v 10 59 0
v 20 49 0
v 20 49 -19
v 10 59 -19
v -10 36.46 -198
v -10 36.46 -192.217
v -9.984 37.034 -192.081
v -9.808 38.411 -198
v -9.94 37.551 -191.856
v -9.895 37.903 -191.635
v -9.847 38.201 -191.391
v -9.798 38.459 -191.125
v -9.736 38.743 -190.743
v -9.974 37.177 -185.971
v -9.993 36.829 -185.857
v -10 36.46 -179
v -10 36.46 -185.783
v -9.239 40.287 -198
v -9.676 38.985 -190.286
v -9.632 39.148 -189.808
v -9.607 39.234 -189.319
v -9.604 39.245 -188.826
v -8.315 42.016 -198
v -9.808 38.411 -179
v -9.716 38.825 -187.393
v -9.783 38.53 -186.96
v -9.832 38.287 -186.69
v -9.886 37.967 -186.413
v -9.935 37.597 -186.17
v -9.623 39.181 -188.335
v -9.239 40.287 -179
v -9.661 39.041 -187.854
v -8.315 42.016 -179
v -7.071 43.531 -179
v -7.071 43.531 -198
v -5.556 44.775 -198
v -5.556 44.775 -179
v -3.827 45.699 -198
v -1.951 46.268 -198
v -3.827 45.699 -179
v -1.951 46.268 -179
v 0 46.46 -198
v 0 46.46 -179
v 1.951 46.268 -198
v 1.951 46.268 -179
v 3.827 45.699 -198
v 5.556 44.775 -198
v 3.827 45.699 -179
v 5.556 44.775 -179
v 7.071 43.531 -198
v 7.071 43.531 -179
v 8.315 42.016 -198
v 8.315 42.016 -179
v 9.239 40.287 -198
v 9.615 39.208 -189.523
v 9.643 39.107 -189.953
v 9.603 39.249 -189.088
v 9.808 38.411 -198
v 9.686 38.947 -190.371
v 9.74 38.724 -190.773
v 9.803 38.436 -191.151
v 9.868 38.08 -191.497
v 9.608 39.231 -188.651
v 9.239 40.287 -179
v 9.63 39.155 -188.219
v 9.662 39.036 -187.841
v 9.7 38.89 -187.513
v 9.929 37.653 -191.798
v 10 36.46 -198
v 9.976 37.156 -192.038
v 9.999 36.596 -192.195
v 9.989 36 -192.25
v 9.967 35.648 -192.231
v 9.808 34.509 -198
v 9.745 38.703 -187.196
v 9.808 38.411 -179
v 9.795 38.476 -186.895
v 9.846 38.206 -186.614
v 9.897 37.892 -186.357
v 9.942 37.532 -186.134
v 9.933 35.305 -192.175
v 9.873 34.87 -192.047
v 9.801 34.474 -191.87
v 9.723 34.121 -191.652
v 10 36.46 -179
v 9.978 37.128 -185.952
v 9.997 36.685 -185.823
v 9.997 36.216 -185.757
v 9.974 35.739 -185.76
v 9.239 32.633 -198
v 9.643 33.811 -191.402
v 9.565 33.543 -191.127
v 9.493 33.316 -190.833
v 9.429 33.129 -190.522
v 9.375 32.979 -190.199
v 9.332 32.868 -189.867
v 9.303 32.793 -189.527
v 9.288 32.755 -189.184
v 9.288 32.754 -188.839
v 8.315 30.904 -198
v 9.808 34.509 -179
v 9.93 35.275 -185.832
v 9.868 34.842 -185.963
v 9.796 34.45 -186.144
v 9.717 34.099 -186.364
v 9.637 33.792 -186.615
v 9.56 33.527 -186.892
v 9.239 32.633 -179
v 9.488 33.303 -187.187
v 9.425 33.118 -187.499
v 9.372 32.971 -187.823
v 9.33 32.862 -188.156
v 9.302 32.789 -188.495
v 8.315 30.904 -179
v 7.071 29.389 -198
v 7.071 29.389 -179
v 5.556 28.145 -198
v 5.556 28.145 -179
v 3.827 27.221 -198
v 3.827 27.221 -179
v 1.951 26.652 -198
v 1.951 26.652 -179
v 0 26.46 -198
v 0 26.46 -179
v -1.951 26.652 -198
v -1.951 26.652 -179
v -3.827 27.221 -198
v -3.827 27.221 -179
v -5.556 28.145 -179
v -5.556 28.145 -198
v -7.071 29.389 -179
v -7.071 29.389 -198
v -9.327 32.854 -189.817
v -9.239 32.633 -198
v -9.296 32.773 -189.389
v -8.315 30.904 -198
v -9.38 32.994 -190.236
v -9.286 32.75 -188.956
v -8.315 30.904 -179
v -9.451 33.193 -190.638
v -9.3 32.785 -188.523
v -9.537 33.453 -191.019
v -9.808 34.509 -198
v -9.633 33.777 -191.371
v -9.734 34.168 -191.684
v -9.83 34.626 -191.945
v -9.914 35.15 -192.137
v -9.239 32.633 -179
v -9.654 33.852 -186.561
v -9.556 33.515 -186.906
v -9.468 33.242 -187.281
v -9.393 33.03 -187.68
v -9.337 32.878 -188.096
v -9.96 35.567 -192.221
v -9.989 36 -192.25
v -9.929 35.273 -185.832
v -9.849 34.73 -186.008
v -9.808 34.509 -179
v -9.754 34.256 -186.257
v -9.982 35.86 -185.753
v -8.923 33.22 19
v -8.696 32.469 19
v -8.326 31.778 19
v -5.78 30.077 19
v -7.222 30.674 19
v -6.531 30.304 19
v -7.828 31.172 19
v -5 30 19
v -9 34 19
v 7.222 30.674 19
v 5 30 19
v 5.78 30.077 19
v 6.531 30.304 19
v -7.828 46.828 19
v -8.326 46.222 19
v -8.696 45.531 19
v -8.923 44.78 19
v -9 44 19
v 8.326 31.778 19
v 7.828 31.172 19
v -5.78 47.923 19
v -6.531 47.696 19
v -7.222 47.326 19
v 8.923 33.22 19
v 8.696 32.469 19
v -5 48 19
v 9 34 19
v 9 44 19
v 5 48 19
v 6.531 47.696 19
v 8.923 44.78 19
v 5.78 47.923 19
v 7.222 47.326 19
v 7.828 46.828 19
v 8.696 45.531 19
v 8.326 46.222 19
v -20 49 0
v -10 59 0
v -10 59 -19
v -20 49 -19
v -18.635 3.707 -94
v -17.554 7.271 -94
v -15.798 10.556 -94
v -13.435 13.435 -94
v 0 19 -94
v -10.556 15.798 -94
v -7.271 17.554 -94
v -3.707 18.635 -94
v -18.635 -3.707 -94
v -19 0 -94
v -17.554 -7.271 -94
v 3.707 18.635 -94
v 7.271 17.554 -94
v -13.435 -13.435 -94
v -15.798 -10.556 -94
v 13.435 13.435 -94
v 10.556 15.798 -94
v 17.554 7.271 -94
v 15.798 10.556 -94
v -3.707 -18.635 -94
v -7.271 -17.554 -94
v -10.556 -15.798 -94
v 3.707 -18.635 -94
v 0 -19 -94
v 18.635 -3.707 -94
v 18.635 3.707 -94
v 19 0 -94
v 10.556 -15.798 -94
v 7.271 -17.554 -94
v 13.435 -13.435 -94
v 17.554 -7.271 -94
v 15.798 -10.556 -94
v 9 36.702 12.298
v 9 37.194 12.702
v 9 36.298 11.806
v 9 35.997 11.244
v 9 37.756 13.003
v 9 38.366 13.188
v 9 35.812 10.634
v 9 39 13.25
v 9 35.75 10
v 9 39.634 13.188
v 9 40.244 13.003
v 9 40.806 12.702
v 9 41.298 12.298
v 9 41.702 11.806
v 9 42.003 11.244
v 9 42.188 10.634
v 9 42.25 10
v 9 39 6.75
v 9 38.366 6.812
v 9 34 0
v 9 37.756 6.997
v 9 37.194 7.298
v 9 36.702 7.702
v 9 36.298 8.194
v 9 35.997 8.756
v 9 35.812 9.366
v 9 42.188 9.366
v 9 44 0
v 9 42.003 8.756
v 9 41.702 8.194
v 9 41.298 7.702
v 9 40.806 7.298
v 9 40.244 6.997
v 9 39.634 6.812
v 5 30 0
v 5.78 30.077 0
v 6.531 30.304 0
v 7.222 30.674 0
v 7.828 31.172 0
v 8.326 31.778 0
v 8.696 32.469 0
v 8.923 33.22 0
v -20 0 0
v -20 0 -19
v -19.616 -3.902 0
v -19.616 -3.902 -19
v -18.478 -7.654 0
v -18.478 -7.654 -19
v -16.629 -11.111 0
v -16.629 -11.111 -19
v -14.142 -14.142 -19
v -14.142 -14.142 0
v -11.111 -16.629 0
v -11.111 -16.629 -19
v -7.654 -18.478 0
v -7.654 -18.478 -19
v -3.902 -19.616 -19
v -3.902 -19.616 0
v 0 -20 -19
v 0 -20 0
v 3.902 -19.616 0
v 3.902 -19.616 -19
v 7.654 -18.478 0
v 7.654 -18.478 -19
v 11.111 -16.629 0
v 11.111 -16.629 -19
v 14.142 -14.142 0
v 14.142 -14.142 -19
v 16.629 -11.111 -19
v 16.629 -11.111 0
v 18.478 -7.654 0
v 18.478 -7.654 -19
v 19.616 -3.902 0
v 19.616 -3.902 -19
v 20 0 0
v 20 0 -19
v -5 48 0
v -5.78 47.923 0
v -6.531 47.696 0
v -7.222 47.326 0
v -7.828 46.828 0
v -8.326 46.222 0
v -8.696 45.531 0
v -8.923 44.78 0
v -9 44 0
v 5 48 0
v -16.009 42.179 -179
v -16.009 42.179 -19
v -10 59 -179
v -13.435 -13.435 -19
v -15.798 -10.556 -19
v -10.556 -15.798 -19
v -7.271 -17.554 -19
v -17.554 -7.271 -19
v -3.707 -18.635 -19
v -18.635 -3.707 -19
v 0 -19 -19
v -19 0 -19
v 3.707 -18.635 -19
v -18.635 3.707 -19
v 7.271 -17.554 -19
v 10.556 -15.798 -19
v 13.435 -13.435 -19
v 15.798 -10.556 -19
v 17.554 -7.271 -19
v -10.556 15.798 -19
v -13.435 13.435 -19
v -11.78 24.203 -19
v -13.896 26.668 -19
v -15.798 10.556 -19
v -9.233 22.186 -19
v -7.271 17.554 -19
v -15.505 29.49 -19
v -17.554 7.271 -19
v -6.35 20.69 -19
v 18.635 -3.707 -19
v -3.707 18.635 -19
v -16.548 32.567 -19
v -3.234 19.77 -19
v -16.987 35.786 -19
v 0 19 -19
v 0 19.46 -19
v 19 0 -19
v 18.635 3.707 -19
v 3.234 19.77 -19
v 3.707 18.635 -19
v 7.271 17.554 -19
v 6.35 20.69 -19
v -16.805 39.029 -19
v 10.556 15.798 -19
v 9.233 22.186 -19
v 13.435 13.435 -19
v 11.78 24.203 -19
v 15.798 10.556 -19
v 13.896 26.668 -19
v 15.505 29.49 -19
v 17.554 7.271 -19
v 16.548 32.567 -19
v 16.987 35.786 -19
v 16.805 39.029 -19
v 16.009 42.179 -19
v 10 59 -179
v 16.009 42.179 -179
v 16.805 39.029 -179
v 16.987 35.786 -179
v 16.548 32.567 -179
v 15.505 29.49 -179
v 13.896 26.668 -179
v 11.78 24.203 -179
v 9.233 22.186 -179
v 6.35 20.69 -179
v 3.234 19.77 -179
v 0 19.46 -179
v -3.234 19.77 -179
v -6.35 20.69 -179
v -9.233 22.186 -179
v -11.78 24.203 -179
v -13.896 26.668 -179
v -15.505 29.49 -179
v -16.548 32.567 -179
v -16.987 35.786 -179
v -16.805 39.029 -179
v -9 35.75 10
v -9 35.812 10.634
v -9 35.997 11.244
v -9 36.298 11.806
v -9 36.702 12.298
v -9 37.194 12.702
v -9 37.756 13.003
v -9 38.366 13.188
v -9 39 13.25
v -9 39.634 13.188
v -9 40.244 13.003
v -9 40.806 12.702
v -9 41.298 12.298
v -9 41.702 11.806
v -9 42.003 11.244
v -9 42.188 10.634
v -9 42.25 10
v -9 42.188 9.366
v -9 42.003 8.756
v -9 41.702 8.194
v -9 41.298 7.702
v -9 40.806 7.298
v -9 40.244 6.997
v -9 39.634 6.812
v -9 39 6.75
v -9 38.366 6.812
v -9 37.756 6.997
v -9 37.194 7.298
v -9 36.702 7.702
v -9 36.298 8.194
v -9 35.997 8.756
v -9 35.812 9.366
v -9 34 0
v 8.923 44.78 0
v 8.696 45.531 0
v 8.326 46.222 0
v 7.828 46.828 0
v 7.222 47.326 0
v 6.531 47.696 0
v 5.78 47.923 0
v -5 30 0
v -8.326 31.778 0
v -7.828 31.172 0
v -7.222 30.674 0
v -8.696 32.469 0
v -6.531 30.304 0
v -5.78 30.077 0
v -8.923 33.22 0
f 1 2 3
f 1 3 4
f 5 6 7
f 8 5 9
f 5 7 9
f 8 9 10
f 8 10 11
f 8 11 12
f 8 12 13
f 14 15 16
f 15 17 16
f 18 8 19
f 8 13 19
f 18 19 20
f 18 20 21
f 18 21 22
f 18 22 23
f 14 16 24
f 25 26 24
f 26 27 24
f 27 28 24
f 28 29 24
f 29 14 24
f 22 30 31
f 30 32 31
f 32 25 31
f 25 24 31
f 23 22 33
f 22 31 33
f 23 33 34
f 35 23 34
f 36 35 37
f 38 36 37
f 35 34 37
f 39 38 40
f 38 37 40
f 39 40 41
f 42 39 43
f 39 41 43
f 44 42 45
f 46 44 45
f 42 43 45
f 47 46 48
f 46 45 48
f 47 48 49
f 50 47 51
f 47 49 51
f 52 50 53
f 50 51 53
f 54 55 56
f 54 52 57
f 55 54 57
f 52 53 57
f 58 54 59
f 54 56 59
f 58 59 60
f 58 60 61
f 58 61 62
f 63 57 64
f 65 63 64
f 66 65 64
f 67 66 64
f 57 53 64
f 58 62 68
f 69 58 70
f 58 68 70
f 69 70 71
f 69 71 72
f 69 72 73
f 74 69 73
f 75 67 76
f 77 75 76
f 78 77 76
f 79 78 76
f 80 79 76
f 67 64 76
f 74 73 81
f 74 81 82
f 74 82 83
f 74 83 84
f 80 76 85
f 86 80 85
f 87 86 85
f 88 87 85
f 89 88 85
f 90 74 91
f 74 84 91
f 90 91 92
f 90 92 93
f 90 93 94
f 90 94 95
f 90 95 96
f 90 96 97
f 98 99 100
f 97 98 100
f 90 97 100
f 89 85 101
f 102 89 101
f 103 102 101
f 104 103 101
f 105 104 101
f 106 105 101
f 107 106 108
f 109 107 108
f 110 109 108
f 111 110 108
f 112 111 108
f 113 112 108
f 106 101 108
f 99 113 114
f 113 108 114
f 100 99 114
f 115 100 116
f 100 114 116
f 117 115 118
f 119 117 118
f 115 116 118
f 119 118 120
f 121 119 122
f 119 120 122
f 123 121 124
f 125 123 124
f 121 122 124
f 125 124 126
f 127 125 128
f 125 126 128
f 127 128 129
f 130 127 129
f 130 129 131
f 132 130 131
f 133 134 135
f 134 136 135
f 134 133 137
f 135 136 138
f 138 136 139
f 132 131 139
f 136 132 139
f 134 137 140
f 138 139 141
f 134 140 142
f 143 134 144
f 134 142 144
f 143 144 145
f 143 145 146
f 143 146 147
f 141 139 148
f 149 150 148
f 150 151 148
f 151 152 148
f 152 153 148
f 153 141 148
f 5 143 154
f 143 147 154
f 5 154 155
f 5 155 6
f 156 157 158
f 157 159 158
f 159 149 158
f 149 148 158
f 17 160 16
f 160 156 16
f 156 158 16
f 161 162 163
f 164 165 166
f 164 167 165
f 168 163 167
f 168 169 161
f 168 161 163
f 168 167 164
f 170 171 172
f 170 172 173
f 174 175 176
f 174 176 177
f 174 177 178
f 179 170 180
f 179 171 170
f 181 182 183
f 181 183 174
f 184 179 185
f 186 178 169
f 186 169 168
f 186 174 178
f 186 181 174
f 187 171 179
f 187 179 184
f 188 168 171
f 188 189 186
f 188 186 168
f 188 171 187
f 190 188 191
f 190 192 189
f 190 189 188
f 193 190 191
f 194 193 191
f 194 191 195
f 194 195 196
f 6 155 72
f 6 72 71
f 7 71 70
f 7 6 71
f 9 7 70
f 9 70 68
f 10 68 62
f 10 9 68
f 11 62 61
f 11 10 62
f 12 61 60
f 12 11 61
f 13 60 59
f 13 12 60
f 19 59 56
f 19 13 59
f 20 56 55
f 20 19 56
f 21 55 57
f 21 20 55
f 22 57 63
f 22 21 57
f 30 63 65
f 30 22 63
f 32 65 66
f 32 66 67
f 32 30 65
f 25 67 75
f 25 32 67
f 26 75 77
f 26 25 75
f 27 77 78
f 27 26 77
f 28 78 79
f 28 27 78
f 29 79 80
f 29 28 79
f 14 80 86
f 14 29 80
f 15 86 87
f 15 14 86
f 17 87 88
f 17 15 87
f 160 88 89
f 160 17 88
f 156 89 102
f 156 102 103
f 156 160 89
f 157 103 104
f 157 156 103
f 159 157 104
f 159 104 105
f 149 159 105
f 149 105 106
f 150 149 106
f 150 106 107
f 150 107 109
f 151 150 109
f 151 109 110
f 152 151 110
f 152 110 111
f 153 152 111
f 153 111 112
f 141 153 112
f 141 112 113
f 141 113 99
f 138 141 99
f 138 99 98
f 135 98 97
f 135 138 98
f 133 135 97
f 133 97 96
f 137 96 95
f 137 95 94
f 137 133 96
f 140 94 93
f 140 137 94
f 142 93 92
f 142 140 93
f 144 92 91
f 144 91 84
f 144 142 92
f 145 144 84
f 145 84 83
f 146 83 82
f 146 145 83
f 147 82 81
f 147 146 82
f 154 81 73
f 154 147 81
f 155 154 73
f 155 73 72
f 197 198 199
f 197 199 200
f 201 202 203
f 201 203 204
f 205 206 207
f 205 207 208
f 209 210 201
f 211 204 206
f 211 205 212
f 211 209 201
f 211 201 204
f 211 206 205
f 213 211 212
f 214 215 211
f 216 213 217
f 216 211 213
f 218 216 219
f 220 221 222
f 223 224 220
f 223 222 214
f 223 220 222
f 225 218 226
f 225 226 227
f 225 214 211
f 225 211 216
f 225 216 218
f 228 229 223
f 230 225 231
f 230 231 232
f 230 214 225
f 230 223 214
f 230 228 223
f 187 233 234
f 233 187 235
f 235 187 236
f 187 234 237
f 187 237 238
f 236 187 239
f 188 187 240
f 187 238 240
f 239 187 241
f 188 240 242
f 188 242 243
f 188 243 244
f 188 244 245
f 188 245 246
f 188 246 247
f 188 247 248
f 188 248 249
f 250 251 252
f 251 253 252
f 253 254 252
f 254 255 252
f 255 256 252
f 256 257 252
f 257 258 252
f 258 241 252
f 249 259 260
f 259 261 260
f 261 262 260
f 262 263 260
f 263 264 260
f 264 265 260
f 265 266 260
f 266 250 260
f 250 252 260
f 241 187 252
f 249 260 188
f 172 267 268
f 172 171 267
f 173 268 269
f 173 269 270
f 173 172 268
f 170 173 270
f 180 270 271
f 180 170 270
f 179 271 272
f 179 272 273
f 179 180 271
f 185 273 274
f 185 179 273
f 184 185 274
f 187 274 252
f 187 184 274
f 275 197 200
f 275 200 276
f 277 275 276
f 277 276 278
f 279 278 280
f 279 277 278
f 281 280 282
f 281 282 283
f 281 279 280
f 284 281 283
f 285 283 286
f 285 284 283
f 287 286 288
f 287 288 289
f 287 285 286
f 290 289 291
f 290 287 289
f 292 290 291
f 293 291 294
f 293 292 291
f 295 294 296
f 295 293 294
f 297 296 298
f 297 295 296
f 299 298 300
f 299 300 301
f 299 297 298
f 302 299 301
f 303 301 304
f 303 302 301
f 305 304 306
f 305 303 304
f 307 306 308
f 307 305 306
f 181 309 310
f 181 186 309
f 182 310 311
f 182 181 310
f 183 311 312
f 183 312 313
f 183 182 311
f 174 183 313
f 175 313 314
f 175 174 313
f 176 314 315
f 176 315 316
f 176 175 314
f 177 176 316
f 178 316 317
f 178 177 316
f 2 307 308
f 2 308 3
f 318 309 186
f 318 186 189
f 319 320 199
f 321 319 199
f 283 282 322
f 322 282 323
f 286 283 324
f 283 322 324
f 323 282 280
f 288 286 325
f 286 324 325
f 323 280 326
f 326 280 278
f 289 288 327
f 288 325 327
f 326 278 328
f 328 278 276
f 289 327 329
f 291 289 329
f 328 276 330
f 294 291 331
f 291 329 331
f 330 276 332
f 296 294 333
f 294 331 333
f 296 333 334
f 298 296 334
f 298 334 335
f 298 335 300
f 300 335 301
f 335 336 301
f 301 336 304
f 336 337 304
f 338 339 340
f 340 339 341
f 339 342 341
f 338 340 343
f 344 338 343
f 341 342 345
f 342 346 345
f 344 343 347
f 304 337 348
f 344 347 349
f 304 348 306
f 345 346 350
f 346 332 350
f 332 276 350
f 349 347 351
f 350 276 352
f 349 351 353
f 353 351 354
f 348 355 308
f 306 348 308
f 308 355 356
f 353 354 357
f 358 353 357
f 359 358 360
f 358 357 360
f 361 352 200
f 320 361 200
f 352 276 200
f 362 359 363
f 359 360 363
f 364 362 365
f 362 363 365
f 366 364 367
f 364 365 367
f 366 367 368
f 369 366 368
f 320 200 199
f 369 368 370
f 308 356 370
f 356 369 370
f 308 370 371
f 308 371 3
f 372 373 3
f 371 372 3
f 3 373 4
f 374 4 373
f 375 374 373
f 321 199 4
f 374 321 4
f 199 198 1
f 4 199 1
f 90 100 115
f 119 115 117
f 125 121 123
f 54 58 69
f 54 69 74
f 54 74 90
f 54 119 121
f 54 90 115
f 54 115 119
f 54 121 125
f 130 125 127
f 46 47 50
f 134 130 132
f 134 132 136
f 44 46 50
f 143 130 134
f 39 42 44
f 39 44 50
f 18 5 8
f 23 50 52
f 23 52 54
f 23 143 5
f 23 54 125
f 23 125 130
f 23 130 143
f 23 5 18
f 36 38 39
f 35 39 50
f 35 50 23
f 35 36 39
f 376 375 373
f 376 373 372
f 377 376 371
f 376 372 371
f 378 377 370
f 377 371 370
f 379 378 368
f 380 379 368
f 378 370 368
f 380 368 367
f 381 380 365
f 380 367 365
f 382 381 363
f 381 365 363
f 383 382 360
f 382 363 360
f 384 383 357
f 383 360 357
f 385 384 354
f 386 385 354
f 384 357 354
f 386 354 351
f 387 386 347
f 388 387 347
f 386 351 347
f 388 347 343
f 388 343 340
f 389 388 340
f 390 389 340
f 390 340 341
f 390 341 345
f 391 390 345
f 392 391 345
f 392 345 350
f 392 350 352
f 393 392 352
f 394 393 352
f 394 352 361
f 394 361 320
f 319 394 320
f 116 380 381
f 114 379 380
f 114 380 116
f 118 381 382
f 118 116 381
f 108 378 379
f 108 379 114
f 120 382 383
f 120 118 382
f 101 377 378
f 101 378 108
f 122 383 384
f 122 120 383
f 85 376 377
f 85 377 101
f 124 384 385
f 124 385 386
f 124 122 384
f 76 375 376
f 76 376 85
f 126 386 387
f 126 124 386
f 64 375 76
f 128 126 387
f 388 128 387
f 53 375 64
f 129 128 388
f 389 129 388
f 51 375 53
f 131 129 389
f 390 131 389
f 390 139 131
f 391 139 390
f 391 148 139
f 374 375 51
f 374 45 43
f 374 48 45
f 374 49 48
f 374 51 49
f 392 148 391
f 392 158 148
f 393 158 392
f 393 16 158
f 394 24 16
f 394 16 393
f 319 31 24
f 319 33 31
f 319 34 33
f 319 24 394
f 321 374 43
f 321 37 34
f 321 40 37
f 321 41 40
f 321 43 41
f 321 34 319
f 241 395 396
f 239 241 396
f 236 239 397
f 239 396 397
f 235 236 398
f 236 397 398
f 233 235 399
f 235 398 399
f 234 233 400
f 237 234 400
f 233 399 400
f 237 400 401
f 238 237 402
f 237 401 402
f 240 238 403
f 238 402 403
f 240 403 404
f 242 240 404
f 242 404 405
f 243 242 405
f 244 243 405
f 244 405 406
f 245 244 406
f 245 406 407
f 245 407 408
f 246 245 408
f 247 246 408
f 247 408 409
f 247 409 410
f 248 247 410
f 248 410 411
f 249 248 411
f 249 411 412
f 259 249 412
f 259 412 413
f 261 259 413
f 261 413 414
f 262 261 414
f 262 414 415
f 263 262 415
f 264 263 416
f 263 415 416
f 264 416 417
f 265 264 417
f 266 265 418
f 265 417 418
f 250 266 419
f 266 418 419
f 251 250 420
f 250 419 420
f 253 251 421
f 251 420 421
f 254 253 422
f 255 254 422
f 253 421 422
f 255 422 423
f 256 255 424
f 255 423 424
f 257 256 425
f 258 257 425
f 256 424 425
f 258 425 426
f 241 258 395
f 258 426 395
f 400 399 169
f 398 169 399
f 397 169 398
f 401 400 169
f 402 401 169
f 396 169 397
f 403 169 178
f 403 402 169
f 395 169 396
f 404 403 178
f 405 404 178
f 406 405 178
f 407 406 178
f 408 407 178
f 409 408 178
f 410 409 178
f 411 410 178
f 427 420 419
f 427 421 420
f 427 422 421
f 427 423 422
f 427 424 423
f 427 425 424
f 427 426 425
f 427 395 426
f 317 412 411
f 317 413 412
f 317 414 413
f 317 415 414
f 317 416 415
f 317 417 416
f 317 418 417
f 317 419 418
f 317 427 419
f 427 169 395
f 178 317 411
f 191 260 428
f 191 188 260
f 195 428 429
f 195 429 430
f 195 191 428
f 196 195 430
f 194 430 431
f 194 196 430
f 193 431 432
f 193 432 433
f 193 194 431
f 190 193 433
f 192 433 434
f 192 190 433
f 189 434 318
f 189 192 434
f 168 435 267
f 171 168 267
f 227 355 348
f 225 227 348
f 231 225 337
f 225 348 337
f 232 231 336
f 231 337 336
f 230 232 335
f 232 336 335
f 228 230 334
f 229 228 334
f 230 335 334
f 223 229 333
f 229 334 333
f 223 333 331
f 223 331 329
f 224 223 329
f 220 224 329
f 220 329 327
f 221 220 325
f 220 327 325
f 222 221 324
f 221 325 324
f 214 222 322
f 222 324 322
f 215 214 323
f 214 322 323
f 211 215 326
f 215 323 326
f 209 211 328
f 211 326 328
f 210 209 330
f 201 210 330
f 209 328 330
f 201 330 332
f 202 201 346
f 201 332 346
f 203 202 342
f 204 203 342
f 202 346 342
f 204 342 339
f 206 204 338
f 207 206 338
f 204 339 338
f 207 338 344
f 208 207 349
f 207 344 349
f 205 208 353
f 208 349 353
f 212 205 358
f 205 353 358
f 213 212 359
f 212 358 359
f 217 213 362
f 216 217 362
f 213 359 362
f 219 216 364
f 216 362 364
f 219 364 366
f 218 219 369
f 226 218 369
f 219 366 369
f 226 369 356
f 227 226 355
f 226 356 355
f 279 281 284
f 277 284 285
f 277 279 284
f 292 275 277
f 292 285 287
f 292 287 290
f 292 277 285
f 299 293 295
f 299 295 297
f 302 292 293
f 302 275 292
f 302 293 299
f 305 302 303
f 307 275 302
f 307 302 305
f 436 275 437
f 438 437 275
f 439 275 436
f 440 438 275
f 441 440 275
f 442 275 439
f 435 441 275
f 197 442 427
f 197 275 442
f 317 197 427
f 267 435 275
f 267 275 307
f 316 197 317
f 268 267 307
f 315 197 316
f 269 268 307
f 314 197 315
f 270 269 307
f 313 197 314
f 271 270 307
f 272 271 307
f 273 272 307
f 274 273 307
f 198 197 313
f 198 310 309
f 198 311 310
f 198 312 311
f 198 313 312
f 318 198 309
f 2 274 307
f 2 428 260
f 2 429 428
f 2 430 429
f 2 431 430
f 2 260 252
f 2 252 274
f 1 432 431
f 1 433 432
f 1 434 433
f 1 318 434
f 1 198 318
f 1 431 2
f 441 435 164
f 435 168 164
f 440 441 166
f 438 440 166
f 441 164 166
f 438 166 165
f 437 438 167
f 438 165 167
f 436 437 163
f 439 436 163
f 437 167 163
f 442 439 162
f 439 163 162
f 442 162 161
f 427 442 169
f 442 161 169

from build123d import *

# Parameters (mm, degrees)
EXTRUDE_1_DEPTH          = 19
EXTRUDE_2_DEPTH          = 160
EXTRUDE_START            = 160
SKETCH_2_3_R             = 10
EXTRUDE_3_DEPTH          = 19
CUT_EXTRUDE_1_DEPTH      = 208.569265548
CUT_EXTRUDE_1_DEPTH_BACK = 208.569265548
SKETCH_3_R               = 3.25
SKETCH_4_R               = 19
EXTRUDE_4_DEPTH          = 75
SKETCH_5_W               = 18
SKETCH_5_H               = 18
EXTRUDE_5_DEPTH          = 19
FILLET_1_R               = 4
SKETCH_6_R               = 3.25
CUT_EXTRUDE_2_DEPTH      = 209.628857159


with BuildPart() as part:
    # 스케치1 → 보스-돌출1 (new body)
    with BuildSketch(Plane.XY):
        with BuildLine():
            Line((-20, 49), (-20, 0))
            ThreePointArc((-20, 0), (0, -20), (20, 0))
            Line((20, 0), (20, 49))
            Line((20, 49), (10, 59))
            Line((10, 59), (-10, 59))
            Line((-10, 59), (-20, 49))
        make_face()
    extrude(amount=-EXTRUDE_1_DEPTH)

    # 스케치2 → 보스-돌출2 (add)
    with BuildSketch(Plane(origin=(0, 0, -19), x_dir=(-1, 0, 0), z_dir=(0, 0, -1))):
        with BuildLine():
            Line((10, 59), (-10, 59))
            Line((-10, 59), (-16.009113575, 42.179115539))
            ThreePointArc((-16.009113575, 42.179115539), (0, 19.46), (16.009113575, 42.179115539))
            Line((16.009113575, 42.179115539), (10, 59))
        make_face()
    extrude(amount=EXTRUDE_2_DEPTH)

    # 스케치2<3> → 보스-돌출3 (add)
    with BuildSketch(Plane(origin=(0, 0, -19), x_dir=(-1, 0, 0), z_dir=(0, 0, -1)).offset(EXTRUDE_START)):
        with Locations((0, 36.46)):
            Circle(SKETCH_2_3_R)
    extrude(amount=EXTRUDE_3_DEPTH)

    # 스케치3 → 컷-돌출1 (cut, two sides: drawn at the far end of the back side and taken through both)
    with BuildSketch(Plane(origin=(0, 0, 0), x_dir=(0, 0, -1), z_dir=(1, 0, 0)).offset(-CUT_EXTRUDE_1_DEPTH_BACK)):
        with Locations((189, 36)):
            Circle(SKETCH_3_R)
    extrude(amount=CUT_EXTRUDE_1_DEPTH + CUT_EXTRUDE_1_DEPTH_BACK, mode=Mode.SUBTRACT)

    # 스케치4 → 보스-돌출4 (add)
    with BuildSketch(Plane(origin=(0, 0, -19), x_dir=(-1, 0, 0), z_dir=(0, 0, -1))):
        Circle(SKETCH_4_R)
    extrude(amount=EXTRUDE_4_DEPTH)

    # 스케치5 → 보스-돌출5 (add)
    with BuildSketch(Plane.XY):
        with Locations((0, 39)):
            Rectangle(SKETCH_5_W, SKETCH_5_H)
    extrude(amount=EXTRUDE_5_DEPTH)

    # 필렛1
    fillet_1_edges = [part.edges().sort_by_distance(p)[0] for p in [
        (-9, 30, 9.5),
        (9, 30, 9.5),
        (-9, 48, 9.5),
        (9, 48, 9.5),
    ]]
    fillet(fillet_1_edges, radius=FILLET_1_R)

    # 스케치6 → 컷-돌출2 (cut, through all)
    with BuildSketch(Plane.ZY.offset(9)):
        with Locations((10, 39)):
            Circle(SKETCH_6_R)
    extrude(amount=-CUT_EXTRUDE_2_DEPTH, mode=Mode.SUBTRACT)


solid = part.part
